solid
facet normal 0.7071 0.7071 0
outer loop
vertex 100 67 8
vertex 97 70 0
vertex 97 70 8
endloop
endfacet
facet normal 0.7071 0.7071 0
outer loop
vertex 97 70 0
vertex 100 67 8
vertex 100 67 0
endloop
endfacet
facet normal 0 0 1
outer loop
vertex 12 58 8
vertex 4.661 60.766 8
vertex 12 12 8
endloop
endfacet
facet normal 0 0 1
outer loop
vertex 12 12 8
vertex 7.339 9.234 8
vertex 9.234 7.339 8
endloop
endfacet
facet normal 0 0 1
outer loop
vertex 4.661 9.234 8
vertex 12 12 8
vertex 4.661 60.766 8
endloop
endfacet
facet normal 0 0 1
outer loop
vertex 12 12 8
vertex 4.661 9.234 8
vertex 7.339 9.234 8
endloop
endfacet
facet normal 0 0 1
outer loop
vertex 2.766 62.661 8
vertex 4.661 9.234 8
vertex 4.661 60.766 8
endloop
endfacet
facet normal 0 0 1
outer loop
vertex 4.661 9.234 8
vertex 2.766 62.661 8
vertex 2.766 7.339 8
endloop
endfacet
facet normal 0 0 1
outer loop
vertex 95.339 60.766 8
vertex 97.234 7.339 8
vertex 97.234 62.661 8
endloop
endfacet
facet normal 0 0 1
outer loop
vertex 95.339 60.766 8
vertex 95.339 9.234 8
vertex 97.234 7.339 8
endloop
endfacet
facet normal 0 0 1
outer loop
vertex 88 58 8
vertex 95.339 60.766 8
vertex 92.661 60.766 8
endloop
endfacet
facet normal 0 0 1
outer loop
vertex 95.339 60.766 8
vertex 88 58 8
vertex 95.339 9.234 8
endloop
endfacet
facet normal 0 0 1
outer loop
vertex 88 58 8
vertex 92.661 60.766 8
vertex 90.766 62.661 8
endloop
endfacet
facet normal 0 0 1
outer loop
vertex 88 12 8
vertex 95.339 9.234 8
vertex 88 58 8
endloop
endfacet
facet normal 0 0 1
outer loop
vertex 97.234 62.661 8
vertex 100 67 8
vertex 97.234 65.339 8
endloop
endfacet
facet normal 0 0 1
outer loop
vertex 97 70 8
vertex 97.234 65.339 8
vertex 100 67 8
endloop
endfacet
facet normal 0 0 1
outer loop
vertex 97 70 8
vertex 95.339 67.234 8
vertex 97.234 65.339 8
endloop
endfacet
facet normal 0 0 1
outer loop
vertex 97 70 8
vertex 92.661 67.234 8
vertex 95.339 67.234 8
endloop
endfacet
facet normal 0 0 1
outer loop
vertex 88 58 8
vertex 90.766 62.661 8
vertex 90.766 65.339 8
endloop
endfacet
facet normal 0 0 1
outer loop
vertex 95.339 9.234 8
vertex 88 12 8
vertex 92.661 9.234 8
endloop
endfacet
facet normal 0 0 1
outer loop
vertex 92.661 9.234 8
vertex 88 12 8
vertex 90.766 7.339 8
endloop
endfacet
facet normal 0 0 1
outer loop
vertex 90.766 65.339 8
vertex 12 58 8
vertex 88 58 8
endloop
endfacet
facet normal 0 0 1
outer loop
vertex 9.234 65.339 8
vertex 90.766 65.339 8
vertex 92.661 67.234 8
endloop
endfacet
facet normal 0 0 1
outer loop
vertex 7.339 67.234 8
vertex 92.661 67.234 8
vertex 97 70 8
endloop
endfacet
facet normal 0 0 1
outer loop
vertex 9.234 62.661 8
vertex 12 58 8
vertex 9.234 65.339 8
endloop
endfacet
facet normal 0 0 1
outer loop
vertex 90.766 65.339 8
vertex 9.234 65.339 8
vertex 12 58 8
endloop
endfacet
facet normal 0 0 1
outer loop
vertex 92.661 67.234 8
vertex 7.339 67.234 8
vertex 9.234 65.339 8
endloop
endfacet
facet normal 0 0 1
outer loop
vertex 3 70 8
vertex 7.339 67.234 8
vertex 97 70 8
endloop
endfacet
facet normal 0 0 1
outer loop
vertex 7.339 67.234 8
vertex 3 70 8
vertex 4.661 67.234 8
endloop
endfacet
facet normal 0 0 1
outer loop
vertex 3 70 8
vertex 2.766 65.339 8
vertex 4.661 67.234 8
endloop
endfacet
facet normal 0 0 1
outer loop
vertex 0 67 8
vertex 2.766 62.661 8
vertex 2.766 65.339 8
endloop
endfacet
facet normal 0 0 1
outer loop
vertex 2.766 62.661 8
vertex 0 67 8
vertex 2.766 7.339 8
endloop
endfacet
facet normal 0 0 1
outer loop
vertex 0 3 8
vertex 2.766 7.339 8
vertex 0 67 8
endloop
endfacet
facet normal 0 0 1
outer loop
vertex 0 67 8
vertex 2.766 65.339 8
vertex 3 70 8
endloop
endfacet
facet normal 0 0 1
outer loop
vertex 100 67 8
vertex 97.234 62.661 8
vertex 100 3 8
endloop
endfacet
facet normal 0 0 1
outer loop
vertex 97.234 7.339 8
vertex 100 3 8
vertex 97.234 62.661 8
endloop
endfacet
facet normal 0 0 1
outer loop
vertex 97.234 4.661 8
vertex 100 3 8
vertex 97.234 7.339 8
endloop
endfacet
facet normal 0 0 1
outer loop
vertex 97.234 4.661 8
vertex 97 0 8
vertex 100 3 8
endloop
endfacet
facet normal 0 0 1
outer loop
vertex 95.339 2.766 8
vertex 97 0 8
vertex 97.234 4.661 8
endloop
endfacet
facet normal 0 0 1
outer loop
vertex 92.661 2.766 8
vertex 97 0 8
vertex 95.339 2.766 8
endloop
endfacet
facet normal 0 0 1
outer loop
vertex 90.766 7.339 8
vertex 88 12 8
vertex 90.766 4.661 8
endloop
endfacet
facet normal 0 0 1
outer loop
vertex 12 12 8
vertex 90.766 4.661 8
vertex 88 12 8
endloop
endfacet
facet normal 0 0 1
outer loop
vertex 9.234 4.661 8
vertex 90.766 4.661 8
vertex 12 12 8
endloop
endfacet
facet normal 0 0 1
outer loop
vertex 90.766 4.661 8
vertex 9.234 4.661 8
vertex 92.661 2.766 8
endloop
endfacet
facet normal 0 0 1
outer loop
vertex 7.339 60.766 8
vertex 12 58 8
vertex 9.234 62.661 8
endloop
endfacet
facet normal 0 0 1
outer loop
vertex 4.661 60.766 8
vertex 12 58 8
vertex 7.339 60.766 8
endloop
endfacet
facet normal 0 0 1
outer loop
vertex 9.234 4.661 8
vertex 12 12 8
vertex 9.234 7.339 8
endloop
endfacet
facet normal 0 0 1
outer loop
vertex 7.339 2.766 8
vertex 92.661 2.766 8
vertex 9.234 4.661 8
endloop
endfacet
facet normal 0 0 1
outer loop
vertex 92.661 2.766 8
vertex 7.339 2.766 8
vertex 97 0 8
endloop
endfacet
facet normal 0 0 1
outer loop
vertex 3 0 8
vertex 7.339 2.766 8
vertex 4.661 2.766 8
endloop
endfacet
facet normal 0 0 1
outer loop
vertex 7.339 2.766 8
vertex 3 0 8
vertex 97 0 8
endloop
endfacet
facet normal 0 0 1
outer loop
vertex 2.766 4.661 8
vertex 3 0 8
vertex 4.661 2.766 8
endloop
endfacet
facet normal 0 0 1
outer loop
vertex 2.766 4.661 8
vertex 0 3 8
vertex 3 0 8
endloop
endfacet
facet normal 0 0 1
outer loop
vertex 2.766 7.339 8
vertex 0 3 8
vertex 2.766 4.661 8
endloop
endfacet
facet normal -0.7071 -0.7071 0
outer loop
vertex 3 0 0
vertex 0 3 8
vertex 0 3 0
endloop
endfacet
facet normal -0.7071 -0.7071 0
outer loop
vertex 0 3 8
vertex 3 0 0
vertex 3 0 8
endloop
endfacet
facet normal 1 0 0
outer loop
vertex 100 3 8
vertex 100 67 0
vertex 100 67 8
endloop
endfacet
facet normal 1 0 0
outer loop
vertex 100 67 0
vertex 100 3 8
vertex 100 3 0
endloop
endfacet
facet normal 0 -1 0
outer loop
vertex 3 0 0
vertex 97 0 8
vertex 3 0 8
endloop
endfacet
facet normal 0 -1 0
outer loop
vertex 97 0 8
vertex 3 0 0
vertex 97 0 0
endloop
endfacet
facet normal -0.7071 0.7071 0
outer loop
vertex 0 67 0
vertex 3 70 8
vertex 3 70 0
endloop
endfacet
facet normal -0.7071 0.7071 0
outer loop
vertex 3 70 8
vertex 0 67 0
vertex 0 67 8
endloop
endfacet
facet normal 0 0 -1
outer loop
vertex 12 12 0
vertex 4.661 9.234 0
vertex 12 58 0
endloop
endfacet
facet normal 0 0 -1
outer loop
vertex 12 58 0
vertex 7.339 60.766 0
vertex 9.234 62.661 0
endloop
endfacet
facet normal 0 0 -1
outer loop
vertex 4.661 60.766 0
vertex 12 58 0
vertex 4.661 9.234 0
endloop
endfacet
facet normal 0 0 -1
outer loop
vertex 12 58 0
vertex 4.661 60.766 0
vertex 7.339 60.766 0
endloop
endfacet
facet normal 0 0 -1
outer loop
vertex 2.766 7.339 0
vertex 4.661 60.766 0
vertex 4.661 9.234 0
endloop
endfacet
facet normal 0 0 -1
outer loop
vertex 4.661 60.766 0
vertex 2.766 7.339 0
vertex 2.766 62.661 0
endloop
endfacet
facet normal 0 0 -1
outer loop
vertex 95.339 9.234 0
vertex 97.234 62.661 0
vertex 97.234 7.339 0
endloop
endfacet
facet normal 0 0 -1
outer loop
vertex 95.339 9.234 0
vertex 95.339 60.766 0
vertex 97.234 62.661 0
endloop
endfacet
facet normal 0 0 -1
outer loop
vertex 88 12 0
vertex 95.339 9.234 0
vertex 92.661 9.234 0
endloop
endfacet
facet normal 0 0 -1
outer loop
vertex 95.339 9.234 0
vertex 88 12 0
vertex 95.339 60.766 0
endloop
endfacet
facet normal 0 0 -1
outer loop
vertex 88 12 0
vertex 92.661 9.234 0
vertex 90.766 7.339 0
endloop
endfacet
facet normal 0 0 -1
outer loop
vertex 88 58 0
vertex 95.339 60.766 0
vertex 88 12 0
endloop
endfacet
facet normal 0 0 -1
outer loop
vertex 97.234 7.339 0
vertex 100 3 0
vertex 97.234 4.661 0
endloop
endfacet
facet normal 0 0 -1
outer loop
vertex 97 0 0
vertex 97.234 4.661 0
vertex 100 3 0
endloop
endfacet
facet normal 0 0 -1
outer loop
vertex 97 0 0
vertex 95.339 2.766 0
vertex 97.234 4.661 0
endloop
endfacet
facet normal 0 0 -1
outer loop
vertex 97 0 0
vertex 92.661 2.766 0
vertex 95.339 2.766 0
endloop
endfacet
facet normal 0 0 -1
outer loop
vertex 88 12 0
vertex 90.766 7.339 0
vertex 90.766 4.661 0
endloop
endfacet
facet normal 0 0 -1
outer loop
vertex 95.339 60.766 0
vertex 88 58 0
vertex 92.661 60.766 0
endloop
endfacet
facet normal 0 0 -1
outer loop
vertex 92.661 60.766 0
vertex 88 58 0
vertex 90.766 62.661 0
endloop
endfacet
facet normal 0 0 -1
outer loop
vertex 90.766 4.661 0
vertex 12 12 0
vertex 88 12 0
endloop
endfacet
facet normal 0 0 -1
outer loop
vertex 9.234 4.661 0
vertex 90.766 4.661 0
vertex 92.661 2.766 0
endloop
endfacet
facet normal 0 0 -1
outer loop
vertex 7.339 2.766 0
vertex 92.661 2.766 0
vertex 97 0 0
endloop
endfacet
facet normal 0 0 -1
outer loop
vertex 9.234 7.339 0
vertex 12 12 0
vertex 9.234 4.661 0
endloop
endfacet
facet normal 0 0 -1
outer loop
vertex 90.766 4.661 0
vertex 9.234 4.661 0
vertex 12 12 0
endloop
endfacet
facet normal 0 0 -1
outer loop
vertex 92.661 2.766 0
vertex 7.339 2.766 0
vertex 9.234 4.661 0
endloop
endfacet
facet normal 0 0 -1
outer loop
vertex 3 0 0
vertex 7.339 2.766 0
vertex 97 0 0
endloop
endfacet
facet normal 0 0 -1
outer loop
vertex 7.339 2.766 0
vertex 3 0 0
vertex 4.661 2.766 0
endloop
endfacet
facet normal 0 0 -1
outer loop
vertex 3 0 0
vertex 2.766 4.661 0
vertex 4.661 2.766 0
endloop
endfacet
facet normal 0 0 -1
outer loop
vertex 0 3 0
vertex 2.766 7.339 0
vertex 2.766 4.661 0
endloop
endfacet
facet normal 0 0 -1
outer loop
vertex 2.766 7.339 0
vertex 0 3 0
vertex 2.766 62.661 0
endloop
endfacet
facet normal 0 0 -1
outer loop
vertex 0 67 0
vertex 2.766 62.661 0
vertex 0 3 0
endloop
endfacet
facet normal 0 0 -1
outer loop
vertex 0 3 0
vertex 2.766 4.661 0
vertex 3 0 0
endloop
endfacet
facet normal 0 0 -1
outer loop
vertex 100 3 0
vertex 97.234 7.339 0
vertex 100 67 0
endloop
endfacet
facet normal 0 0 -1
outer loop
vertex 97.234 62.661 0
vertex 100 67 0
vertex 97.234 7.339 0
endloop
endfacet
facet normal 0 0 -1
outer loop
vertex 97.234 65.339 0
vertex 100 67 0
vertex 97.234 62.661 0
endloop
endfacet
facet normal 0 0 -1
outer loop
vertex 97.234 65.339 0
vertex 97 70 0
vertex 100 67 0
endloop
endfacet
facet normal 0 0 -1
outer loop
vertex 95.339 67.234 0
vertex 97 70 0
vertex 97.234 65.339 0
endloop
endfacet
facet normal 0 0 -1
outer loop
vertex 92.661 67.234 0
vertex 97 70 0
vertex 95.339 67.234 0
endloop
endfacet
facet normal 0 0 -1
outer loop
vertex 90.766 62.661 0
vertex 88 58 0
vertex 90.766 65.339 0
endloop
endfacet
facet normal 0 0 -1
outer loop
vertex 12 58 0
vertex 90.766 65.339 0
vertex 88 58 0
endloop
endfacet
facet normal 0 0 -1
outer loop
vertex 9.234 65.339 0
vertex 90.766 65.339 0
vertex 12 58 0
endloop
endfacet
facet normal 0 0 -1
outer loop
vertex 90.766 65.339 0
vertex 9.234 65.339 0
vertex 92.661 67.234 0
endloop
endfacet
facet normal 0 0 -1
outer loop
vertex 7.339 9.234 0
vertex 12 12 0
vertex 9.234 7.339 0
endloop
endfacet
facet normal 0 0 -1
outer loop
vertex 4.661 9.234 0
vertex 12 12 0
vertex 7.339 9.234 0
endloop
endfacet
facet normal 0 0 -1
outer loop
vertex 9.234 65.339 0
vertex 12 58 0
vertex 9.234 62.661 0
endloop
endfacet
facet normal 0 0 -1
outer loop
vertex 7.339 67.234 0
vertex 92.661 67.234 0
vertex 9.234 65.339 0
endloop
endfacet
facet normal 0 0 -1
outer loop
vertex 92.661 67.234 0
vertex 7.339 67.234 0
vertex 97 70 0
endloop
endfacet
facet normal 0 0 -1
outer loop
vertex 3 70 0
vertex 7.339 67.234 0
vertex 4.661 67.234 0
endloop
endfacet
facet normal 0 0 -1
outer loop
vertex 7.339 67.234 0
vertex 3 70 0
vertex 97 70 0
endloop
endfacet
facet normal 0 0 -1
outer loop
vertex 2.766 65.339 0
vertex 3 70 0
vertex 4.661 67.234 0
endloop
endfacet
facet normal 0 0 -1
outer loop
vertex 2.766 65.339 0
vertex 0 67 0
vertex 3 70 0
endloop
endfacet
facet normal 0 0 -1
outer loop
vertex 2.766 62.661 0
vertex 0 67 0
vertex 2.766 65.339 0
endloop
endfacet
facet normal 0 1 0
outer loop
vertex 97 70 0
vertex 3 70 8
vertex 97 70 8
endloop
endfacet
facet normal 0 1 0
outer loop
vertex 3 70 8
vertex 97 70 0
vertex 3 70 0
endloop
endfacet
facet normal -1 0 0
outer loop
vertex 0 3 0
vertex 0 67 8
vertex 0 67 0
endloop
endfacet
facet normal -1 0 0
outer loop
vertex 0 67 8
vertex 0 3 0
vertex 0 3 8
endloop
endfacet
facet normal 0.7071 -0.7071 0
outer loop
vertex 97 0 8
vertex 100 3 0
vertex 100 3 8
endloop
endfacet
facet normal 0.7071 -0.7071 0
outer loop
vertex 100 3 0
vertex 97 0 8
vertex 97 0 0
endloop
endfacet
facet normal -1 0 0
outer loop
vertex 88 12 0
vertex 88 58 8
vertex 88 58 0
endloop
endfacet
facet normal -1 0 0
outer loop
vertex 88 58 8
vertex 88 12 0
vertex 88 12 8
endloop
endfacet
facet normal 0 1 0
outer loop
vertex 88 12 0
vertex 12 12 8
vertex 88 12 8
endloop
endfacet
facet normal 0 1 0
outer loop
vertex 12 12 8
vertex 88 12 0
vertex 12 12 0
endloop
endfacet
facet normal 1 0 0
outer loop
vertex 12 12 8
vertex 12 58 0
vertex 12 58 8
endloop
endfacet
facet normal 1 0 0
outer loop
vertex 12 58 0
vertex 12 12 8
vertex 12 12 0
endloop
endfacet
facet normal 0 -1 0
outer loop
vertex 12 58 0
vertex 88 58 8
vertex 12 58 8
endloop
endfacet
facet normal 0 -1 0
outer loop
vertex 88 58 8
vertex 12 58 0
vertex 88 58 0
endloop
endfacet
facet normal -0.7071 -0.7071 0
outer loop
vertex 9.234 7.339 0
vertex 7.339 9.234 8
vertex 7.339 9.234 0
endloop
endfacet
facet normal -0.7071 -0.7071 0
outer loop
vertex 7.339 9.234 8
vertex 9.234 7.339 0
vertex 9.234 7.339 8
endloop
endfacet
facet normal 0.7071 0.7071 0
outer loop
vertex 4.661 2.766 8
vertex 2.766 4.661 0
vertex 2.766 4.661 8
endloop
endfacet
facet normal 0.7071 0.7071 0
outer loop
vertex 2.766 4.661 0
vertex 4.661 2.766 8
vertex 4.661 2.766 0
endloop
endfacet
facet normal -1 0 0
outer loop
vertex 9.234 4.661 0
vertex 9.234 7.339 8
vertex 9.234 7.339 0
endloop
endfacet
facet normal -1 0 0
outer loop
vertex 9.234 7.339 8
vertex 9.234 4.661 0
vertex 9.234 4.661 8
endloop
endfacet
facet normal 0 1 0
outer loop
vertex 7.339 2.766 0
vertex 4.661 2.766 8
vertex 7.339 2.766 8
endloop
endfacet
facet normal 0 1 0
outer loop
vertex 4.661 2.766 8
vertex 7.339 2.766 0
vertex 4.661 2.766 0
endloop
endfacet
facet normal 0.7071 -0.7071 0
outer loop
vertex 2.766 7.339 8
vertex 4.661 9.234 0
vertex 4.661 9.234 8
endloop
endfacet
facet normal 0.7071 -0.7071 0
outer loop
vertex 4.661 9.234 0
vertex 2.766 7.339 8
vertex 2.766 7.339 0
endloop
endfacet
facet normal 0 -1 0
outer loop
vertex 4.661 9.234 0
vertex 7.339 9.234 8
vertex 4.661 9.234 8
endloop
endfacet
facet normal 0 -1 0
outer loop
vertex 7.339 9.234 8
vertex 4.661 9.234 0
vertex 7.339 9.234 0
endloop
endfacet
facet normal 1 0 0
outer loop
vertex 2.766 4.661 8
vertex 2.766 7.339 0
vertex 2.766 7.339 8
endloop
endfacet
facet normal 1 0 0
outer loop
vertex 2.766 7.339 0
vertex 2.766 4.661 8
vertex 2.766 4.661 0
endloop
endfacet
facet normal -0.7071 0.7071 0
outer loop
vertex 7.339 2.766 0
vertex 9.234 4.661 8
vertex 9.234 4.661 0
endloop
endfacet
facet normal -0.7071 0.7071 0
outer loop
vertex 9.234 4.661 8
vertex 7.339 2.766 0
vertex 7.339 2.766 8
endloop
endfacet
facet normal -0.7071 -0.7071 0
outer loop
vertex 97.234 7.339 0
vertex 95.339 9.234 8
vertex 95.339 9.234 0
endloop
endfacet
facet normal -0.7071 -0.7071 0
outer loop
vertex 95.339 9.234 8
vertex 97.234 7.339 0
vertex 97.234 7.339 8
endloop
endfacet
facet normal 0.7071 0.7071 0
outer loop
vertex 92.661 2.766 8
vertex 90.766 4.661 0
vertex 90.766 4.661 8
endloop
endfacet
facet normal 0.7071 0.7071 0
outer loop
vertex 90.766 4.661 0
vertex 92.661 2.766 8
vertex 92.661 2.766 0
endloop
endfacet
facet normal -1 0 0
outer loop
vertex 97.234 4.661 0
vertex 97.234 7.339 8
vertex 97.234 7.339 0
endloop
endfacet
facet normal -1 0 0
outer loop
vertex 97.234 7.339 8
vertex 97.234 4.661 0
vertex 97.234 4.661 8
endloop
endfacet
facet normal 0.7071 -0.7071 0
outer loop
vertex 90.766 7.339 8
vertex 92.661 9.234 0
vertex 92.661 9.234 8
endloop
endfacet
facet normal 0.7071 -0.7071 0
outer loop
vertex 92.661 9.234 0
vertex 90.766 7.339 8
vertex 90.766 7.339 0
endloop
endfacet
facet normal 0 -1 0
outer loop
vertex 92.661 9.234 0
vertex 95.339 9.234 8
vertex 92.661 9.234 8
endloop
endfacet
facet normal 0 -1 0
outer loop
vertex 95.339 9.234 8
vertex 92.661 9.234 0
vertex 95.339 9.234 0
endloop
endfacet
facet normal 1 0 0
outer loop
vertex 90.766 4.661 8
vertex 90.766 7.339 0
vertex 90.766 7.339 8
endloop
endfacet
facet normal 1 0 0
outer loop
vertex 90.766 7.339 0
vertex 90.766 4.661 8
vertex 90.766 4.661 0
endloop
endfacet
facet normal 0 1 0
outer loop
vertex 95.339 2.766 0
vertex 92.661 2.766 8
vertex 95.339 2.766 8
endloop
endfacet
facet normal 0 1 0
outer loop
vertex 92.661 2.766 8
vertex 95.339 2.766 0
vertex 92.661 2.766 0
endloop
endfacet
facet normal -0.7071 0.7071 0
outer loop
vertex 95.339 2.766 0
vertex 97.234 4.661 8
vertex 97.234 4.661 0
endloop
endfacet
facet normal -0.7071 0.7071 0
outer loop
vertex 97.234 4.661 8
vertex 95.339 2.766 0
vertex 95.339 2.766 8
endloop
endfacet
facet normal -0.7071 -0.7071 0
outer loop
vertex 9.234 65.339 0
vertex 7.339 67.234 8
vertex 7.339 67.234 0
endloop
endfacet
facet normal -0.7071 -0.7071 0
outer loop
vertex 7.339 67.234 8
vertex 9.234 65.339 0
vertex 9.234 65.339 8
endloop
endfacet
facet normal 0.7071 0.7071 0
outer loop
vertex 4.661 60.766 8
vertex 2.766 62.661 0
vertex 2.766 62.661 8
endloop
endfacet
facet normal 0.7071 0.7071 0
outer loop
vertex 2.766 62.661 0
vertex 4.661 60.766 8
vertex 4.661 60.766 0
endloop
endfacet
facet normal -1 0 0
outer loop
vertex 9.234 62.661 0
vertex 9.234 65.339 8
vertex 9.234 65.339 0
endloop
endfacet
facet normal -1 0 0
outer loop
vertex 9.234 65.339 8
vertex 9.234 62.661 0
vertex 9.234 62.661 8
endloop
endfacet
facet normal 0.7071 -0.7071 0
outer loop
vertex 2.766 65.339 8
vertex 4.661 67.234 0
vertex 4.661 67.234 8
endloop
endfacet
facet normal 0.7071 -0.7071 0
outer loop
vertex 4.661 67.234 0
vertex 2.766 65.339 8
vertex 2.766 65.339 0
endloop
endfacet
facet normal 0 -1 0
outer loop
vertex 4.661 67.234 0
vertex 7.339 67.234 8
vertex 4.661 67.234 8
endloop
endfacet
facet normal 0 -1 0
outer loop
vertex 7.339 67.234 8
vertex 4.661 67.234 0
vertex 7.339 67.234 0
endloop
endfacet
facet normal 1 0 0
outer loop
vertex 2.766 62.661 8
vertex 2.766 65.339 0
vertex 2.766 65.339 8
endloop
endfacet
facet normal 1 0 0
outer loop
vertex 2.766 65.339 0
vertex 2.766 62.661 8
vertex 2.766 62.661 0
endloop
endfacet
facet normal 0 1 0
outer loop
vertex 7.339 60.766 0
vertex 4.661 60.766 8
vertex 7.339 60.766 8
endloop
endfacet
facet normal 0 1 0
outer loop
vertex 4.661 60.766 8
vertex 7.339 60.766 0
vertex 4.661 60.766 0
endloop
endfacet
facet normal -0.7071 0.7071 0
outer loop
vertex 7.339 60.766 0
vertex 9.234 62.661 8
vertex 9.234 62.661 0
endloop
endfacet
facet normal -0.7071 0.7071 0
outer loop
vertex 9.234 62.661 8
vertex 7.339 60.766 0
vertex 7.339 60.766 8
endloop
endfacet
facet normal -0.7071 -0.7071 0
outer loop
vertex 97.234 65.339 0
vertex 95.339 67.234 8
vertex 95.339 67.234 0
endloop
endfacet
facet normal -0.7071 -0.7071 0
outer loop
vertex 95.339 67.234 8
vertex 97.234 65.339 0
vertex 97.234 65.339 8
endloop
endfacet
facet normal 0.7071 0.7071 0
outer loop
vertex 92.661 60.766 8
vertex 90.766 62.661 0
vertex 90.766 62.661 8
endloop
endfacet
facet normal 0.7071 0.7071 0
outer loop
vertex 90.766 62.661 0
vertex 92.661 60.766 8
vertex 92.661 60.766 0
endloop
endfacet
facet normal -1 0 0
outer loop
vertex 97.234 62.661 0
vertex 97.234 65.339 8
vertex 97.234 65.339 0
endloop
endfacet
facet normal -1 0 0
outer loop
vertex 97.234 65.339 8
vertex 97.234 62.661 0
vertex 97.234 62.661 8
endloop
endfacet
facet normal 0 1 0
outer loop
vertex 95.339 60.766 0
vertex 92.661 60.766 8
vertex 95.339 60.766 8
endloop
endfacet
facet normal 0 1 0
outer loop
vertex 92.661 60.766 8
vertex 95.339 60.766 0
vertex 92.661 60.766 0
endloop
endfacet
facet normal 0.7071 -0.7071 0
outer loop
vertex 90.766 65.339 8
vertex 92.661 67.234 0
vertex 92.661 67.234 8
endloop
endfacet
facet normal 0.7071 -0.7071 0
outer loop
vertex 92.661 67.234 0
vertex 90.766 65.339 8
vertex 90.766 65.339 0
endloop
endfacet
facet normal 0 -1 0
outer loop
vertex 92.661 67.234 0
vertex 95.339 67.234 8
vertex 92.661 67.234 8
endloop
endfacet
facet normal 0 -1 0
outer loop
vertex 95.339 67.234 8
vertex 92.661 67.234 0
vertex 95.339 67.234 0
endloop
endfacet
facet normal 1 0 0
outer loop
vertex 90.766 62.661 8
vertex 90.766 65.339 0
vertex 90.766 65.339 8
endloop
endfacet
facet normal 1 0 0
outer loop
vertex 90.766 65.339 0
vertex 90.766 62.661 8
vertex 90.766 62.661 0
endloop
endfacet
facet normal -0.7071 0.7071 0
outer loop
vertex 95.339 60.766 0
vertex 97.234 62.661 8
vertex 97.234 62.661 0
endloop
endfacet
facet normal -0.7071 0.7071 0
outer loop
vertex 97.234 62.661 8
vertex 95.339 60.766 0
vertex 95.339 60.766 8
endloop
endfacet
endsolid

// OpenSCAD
$fn = 32;

// ----------------------------------------------------------------------
// Frame plate: 100 x 70 frame, 12 mm rails
// ----------------------------------------------------------------------

// --- parameters (mm) ---
plate_l = 100;            // plate length, X
plate_w = 70;             // plate width, Y
plate_t = 8;              // plate thickness, Z (extrusion height)
corner_c = 3;             // corner chamfer
frame_bar = 12;           // frame rail width
bolt_r = 3.5;             // corner bolt window radius
bolt_inset = 6;           // bolt centre inset from the edges

win_l = plate_l - 2 * frame_bar;  // window length
win_w = plate_w - 2 * frame_bar;  // window width
bolt_d = 2 * bolt_r;  // corner hole diameter

profile = [[3, 0], [97, 0], [100, 3], [100, 67], [97, 70], [3, 70], [0, 67], [0, 3]];  // primary outline, 8 points, counter clockwise
void_1 = [[12, 12], [88, 12], [88, 58], [12, 58]];  // the window, 4 points
void_2 = [[9.234, 7.339], [7.339, 9.234], [4.661, 9.234], [2.766, 7.339], [2.766, 4.661], [4.661, 2.766], [7.339, 2.766], [9.234, 4.661]];  // corner bolt window, 8 points
void_3 = [[97.234, 7.339], [95.339, 9.234], [92.661, 9.234], [90.766, 7.339], [90.766, 4.661], [92.661, 2.766], [95.339, 2.766], [97.234, 4.661]];  // corner bolt window, 8 points
void_4 = [[9.234, 65.339], [7.339, 67.234], [4.661, 67.234], [2.766, 65.339], [2.766, 62.661], [4.661, 60.766], [7.339, 60.766], [9.234, 62.661]];  // corner bolt window, 8 points
void_5 = [[97.234, 65.339], [95.339, 67.234], [92.661, 67.234], [90.766, 65.339], [90.766, 62.661], [92.661, 60.766], [95.339, 60.766], [97.234, 62.661]];  // corner bolt window, 8 points

// --- the one profile operation ---
difference() {
  linear_extrude(height = plate_t) polygon(points = profile);
  translate([0, 0, -1])
    linear_extrude(height = plate_t + 2) polygon(points = void_1);
  translate([0, 0, -1])
    linear_extrude(height = plate_t + 2) polygon(points = void_2);
  translate([0, 0, -1])
    linear_extrude(height = plate_t + 2) polygon(points = void_3);
  translate([0, 0, -1])
    linear_extrude(height = plate_t + 2) polygon(points = void_4);
  translate([0, 0, -1])
    linear_extrude(height = plate_t + 2) polygon(points = void_5);
}
